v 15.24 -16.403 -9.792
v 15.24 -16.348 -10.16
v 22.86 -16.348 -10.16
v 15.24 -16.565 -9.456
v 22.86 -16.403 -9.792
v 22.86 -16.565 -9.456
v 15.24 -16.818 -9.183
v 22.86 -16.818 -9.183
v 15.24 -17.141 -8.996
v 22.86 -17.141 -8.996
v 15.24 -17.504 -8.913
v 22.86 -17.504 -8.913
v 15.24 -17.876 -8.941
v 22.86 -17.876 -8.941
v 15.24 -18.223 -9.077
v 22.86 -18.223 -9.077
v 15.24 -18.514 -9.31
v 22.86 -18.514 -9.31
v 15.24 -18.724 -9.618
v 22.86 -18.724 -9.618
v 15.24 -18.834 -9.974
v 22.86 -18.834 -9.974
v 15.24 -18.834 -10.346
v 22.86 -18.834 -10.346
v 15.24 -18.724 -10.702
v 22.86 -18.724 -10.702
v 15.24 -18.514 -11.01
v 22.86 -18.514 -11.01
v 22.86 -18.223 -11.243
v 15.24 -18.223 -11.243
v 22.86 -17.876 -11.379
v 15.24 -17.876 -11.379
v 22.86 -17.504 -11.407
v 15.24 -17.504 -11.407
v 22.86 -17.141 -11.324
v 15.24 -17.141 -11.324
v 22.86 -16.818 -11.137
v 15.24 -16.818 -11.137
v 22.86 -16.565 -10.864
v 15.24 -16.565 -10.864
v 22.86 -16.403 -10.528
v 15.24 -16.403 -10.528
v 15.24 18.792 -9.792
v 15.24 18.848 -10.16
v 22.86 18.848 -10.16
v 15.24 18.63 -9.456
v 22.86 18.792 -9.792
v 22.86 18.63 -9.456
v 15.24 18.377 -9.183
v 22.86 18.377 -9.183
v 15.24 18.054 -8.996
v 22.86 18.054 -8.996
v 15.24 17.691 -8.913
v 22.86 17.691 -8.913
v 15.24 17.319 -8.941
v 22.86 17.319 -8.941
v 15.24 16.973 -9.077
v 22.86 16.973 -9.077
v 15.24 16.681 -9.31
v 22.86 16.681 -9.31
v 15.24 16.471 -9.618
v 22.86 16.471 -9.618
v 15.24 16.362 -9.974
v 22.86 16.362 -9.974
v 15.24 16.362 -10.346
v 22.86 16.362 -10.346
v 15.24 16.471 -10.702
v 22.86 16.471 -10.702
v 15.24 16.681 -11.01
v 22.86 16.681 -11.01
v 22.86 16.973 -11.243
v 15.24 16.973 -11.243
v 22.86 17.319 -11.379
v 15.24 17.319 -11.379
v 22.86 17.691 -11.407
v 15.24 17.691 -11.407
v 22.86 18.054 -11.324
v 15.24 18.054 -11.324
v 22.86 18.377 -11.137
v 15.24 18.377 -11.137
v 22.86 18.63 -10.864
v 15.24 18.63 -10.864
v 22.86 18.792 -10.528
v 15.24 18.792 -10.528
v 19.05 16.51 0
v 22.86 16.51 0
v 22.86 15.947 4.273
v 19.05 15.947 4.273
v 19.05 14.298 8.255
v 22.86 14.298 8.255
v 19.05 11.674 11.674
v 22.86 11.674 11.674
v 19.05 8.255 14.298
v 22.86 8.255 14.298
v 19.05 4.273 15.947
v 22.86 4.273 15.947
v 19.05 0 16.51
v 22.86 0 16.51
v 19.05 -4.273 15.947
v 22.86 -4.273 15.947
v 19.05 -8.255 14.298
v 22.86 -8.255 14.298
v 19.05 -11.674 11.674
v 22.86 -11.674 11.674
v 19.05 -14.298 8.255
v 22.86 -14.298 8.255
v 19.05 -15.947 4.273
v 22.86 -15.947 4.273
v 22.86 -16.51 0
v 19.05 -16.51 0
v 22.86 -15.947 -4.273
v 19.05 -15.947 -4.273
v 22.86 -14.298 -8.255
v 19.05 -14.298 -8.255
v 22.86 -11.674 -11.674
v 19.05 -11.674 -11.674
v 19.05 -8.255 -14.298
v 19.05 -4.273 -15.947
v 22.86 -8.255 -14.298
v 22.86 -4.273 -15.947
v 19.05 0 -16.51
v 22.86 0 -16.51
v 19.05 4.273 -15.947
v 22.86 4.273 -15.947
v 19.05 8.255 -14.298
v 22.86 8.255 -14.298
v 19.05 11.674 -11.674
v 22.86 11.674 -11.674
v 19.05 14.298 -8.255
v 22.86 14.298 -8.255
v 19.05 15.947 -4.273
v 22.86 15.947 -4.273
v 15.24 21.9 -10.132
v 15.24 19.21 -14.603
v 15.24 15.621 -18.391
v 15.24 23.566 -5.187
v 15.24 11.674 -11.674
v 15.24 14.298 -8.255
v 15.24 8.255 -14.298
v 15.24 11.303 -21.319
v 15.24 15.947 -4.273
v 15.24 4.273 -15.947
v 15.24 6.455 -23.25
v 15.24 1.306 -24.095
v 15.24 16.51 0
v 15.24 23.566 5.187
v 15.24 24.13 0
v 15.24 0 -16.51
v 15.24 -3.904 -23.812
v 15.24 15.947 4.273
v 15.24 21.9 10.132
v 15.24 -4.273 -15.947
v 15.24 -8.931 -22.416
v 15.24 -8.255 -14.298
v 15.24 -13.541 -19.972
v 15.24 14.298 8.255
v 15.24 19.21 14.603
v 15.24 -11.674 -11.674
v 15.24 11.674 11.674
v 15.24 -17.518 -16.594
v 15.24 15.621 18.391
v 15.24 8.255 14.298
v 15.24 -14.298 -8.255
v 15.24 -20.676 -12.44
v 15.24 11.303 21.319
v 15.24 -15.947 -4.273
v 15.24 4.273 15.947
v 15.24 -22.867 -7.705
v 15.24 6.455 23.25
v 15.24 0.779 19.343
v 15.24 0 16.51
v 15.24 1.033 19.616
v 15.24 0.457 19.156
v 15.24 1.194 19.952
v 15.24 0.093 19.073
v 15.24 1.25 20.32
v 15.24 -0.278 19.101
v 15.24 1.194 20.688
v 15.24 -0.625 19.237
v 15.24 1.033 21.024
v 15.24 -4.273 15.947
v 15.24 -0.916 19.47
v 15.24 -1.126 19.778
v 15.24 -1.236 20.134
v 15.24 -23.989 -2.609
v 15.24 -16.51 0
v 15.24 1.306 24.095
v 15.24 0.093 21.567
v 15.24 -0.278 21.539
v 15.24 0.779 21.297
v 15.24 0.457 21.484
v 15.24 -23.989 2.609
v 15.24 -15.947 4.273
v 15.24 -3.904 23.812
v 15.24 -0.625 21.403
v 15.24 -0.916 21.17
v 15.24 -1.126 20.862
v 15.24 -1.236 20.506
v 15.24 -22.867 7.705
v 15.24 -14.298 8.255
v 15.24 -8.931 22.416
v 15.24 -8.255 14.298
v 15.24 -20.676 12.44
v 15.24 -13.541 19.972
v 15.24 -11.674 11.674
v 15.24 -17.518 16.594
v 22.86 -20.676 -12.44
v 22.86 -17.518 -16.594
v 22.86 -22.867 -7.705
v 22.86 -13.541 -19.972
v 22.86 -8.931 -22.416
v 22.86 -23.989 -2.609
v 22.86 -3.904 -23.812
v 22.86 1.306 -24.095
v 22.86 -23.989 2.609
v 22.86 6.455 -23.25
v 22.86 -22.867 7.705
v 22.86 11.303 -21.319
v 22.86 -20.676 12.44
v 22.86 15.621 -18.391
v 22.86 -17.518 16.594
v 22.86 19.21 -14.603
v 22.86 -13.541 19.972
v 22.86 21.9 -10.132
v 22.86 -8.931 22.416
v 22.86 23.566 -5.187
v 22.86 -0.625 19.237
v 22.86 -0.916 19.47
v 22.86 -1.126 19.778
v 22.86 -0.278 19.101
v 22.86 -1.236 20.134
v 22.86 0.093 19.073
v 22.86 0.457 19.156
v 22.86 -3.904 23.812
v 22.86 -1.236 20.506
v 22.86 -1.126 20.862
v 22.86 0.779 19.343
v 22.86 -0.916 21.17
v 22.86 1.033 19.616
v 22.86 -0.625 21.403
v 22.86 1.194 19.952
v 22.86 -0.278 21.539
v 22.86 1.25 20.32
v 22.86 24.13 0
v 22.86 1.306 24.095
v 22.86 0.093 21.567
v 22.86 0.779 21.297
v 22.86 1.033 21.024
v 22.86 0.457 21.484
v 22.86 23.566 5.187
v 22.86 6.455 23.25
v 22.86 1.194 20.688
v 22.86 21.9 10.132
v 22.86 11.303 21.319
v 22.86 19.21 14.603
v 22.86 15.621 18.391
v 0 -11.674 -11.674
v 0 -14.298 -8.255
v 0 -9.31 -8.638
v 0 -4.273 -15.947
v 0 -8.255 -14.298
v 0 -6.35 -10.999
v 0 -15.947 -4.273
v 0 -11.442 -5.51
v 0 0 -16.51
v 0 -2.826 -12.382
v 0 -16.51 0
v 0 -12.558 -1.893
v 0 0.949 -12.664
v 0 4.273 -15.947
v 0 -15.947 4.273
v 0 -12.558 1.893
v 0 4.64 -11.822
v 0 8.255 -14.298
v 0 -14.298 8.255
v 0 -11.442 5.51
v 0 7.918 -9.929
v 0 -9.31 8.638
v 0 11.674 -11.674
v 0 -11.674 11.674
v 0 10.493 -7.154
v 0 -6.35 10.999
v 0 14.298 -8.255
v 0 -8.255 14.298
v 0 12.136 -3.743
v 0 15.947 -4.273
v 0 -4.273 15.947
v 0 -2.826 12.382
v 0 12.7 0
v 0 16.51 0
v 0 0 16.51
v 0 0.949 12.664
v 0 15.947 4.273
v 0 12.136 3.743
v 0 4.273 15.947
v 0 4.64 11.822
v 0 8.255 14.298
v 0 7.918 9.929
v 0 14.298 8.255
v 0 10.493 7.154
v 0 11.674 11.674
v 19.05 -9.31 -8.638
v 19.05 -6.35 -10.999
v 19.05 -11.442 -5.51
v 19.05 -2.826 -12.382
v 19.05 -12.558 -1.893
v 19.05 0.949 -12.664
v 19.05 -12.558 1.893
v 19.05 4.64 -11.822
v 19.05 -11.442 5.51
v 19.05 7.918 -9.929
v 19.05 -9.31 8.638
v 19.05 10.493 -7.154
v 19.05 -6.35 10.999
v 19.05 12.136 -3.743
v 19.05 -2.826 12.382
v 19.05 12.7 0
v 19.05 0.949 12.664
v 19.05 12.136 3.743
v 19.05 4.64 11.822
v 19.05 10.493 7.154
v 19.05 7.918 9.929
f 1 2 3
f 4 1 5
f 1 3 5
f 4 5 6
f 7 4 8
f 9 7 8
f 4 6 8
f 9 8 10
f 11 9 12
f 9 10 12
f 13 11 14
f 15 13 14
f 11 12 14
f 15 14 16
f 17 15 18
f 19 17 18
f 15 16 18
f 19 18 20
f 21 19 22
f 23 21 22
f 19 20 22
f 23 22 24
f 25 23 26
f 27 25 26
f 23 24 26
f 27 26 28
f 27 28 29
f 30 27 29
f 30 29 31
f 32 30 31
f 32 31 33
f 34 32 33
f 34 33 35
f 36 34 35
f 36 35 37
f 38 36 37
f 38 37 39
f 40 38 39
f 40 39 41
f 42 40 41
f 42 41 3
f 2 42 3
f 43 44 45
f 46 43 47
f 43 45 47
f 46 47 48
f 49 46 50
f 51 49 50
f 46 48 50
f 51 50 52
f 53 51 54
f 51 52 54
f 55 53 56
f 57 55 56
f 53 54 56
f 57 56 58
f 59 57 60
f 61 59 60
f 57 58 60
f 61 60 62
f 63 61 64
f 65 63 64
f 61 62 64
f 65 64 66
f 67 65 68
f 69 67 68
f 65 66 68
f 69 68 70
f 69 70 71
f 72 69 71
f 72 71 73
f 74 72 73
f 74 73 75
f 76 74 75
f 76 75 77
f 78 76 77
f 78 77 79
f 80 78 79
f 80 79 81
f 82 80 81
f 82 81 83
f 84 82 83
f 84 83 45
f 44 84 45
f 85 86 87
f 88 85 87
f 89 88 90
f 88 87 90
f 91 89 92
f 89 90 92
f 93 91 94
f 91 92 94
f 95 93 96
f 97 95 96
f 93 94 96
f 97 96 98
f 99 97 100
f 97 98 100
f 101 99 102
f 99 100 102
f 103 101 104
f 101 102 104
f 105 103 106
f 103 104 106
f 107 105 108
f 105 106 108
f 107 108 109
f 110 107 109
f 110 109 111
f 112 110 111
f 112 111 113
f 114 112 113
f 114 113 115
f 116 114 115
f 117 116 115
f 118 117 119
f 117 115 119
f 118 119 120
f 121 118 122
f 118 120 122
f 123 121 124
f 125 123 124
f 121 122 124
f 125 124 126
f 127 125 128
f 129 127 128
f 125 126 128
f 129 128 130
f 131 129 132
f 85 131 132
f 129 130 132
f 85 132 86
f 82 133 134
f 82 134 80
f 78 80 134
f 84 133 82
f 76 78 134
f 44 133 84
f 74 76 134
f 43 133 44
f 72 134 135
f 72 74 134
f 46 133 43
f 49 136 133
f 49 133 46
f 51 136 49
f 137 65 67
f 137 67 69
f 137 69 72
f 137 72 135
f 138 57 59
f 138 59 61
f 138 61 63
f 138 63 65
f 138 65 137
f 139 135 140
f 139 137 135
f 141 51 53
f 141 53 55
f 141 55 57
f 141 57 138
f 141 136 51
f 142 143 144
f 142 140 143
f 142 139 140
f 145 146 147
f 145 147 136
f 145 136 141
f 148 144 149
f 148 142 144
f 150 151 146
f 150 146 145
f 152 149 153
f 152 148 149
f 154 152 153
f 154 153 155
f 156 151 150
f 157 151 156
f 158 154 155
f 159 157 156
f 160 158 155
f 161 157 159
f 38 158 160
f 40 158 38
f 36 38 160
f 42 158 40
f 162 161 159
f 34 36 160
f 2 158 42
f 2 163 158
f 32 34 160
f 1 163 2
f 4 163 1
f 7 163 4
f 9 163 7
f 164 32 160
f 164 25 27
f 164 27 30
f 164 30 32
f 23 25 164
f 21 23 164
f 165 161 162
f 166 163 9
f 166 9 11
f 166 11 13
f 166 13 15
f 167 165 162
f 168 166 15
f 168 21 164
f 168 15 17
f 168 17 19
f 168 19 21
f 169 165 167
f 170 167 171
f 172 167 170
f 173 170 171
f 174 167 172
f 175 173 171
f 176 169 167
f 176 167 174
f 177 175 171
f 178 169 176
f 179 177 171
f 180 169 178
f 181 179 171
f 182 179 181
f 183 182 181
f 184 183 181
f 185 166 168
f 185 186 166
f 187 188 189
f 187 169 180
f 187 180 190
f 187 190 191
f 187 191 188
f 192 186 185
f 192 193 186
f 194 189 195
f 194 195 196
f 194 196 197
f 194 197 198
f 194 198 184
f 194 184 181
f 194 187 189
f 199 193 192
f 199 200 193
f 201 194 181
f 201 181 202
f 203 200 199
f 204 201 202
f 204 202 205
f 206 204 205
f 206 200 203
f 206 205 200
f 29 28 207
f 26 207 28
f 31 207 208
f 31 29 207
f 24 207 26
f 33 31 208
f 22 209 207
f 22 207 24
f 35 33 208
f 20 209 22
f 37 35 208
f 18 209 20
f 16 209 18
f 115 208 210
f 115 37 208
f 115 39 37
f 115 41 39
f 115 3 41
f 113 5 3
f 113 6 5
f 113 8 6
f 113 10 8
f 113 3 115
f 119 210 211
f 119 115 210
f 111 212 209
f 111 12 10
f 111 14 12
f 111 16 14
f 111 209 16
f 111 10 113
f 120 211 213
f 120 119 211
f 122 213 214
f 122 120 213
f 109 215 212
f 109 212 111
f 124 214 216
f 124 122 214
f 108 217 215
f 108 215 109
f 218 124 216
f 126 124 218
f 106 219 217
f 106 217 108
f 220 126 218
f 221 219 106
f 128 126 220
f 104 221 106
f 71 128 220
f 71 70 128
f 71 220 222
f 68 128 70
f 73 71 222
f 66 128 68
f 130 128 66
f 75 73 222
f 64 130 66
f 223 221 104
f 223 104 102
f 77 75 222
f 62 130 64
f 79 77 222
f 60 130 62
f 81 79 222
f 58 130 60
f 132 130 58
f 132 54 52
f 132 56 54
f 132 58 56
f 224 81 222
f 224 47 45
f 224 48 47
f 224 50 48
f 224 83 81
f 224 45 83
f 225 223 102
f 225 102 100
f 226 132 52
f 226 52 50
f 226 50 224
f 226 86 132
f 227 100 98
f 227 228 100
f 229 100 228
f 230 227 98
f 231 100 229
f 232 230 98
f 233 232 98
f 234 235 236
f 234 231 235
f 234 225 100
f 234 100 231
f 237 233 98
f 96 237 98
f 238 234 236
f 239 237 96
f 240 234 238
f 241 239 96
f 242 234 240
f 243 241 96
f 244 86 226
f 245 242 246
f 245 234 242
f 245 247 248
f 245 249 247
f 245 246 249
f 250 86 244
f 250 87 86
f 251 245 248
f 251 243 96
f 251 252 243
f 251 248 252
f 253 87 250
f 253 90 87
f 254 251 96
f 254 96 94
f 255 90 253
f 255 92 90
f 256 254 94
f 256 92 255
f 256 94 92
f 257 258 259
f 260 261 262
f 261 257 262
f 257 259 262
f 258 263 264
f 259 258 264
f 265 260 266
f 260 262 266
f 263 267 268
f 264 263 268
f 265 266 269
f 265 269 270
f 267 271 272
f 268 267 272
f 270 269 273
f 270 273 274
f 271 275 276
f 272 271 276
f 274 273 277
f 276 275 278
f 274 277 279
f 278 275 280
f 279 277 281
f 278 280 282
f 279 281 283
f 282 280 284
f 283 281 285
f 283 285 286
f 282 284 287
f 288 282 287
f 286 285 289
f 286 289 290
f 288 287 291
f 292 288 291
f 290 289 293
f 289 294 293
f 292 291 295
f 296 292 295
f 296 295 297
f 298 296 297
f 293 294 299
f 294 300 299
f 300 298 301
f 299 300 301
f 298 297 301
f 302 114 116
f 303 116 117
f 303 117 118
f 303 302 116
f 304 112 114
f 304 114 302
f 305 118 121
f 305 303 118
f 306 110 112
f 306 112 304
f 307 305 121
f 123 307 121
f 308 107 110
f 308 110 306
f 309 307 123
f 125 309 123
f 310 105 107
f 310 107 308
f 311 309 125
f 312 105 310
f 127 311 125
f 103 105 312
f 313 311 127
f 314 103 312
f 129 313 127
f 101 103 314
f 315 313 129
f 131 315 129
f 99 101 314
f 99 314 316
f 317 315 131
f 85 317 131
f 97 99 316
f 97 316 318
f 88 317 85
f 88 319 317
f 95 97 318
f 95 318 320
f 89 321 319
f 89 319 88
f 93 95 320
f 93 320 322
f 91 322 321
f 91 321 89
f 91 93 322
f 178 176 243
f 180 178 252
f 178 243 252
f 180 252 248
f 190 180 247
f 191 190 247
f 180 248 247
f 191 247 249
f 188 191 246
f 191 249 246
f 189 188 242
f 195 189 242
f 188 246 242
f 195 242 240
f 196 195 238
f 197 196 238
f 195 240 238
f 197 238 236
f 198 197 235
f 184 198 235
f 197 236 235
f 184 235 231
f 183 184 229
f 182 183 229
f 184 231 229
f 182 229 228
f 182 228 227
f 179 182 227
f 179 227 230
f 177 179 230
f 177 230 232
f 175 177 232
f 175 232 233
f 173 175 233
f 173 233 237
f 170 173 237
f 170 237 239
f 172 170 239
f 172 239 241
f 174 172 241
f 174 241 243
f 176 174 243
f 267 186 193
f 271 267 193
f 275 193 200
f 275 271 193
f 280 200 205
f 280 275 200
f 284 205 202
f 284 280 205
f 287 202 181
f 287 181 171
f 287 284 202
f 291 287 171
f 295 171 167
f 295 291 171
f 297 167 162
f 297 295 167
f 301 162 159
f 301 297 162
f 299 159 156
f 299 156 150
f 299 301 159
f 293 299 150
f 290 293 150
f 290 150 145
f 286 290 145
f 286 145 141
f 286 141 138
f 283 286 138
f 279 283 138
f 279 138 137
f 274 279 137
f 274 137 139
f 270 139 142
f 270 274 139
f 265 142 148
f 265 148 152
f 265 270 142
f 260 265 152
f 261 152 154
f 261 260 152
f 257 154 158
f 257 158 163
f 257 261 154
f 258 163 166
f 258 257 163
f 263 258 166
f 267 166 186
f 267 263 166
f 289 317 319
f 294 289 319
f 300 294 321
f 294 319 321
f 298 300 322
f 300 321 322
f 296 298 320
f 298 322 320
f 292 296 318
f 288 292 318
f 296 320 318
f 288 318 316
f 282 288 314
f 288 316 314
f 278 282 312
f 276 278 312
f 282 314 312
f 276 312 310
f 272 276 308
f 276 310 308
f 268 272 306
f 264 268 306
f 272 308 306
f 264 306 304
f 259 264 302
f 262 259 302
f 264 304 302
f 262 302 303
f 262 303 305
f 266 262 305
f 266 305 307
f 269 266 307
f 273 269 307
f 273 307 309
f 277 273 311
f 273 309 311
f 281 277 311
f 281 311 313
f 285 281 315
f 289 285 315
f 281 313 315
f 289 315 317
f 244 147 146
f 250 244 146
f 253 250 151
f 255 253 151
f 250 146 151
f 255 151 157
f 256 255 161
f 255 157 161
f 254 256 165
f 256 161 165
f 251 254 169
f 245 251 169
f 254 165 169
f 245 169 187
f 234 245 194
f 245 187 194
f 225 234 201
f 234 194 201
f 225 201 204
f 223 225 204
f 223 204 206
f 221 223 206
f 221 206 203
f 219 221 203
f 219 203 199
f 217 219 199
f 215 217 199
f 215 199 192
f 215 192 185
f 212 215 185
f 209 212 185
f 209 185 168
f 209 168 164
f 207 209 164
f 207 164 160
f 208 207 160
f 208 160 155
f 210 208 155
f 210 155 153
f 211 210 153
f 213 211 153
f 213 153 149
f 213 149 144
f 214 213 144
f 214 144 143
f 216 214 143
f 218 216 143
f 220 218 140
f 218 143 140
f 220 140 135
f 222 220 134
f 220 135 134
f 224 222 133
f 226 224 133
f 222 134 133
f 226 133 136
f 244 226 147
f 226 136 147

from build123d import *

# Parameters (mm, degrees)
F0_R        = 24.13
F1_DEPTH    = 22.86
F2_R        = 16.51
F3_DEPTH    = 3.81
F4_R        = 12.7
F5_DEPTH    = 19.05
F6_R        = 24.13
F6_R_2      = 16.51
F7_DEPTH    = 15.24
F8_R        = 1.25
F7_FACE_R   = 24.13
F7_FACE_R_2 = 16.51
F9_DEPTH    = 25.4


with BuildPart() as f1:
    # F0 (on Right) → F1 (new body)
    with BuildSketch(Plane.YZ):
        Circle(F0_R)
    extrude(amount=F1_DEPTH)

    # F2 (on face) → F3 (cut)
    with BuildSketch(Plane.YZ.offset(22.86)):
        Circle(F2_R)
    extrude(amount=-F3_DEPTH, mode=Mode.SUBTRACT)

    # F4 (on face) → F5 (cut, through all)
    with BuildSketch(Plane.YZ.offset(19.05)):
        Circle(F4_R)
    extrude(amount=-F5_DEPTH, mode=Mode.SUBTRACT)

    # F6 (on face) → F7 (cut)
    with BuildSketch(Plane(origin=(0, 0, 0), x_dir=(0, -1, 0), z_dir=(-1, 0, 0))):
        Circle(F6_R)
        Circle(F6_R_2, mode=Mode.SUBTRACT)
    extrude(amount=-F7_DEPTH, mode=Mode.SUBTRACT)

    # F8 (on face) + F7_face (on face) → F9 (cut)
    with BuildSketch(Plane.YZ.offset(22.86)):
        with Locations((0, 20.32)):
            Circle(F8_R)
        with Locations((-17.5976362049, -10.16)):
            Circle(F8_R)
        with Locations((17.5976362049, -10.16)):
            Circle(F8_R)
    with BuildSketch(Plane(origin=(15.24, 0, 0), x_dir=(0, -1, 0), z_dir=(-1, 0, 0))):
        Circle(F7_FACE_R)
        Circle(F7_FACE_R_2, mode=Mode.SUBTRACT)
    extrude(amount=-F9_DEPTH, dir=(1, 0, 0), mode=Mode.SUBTRACT)


solid = f1.part
